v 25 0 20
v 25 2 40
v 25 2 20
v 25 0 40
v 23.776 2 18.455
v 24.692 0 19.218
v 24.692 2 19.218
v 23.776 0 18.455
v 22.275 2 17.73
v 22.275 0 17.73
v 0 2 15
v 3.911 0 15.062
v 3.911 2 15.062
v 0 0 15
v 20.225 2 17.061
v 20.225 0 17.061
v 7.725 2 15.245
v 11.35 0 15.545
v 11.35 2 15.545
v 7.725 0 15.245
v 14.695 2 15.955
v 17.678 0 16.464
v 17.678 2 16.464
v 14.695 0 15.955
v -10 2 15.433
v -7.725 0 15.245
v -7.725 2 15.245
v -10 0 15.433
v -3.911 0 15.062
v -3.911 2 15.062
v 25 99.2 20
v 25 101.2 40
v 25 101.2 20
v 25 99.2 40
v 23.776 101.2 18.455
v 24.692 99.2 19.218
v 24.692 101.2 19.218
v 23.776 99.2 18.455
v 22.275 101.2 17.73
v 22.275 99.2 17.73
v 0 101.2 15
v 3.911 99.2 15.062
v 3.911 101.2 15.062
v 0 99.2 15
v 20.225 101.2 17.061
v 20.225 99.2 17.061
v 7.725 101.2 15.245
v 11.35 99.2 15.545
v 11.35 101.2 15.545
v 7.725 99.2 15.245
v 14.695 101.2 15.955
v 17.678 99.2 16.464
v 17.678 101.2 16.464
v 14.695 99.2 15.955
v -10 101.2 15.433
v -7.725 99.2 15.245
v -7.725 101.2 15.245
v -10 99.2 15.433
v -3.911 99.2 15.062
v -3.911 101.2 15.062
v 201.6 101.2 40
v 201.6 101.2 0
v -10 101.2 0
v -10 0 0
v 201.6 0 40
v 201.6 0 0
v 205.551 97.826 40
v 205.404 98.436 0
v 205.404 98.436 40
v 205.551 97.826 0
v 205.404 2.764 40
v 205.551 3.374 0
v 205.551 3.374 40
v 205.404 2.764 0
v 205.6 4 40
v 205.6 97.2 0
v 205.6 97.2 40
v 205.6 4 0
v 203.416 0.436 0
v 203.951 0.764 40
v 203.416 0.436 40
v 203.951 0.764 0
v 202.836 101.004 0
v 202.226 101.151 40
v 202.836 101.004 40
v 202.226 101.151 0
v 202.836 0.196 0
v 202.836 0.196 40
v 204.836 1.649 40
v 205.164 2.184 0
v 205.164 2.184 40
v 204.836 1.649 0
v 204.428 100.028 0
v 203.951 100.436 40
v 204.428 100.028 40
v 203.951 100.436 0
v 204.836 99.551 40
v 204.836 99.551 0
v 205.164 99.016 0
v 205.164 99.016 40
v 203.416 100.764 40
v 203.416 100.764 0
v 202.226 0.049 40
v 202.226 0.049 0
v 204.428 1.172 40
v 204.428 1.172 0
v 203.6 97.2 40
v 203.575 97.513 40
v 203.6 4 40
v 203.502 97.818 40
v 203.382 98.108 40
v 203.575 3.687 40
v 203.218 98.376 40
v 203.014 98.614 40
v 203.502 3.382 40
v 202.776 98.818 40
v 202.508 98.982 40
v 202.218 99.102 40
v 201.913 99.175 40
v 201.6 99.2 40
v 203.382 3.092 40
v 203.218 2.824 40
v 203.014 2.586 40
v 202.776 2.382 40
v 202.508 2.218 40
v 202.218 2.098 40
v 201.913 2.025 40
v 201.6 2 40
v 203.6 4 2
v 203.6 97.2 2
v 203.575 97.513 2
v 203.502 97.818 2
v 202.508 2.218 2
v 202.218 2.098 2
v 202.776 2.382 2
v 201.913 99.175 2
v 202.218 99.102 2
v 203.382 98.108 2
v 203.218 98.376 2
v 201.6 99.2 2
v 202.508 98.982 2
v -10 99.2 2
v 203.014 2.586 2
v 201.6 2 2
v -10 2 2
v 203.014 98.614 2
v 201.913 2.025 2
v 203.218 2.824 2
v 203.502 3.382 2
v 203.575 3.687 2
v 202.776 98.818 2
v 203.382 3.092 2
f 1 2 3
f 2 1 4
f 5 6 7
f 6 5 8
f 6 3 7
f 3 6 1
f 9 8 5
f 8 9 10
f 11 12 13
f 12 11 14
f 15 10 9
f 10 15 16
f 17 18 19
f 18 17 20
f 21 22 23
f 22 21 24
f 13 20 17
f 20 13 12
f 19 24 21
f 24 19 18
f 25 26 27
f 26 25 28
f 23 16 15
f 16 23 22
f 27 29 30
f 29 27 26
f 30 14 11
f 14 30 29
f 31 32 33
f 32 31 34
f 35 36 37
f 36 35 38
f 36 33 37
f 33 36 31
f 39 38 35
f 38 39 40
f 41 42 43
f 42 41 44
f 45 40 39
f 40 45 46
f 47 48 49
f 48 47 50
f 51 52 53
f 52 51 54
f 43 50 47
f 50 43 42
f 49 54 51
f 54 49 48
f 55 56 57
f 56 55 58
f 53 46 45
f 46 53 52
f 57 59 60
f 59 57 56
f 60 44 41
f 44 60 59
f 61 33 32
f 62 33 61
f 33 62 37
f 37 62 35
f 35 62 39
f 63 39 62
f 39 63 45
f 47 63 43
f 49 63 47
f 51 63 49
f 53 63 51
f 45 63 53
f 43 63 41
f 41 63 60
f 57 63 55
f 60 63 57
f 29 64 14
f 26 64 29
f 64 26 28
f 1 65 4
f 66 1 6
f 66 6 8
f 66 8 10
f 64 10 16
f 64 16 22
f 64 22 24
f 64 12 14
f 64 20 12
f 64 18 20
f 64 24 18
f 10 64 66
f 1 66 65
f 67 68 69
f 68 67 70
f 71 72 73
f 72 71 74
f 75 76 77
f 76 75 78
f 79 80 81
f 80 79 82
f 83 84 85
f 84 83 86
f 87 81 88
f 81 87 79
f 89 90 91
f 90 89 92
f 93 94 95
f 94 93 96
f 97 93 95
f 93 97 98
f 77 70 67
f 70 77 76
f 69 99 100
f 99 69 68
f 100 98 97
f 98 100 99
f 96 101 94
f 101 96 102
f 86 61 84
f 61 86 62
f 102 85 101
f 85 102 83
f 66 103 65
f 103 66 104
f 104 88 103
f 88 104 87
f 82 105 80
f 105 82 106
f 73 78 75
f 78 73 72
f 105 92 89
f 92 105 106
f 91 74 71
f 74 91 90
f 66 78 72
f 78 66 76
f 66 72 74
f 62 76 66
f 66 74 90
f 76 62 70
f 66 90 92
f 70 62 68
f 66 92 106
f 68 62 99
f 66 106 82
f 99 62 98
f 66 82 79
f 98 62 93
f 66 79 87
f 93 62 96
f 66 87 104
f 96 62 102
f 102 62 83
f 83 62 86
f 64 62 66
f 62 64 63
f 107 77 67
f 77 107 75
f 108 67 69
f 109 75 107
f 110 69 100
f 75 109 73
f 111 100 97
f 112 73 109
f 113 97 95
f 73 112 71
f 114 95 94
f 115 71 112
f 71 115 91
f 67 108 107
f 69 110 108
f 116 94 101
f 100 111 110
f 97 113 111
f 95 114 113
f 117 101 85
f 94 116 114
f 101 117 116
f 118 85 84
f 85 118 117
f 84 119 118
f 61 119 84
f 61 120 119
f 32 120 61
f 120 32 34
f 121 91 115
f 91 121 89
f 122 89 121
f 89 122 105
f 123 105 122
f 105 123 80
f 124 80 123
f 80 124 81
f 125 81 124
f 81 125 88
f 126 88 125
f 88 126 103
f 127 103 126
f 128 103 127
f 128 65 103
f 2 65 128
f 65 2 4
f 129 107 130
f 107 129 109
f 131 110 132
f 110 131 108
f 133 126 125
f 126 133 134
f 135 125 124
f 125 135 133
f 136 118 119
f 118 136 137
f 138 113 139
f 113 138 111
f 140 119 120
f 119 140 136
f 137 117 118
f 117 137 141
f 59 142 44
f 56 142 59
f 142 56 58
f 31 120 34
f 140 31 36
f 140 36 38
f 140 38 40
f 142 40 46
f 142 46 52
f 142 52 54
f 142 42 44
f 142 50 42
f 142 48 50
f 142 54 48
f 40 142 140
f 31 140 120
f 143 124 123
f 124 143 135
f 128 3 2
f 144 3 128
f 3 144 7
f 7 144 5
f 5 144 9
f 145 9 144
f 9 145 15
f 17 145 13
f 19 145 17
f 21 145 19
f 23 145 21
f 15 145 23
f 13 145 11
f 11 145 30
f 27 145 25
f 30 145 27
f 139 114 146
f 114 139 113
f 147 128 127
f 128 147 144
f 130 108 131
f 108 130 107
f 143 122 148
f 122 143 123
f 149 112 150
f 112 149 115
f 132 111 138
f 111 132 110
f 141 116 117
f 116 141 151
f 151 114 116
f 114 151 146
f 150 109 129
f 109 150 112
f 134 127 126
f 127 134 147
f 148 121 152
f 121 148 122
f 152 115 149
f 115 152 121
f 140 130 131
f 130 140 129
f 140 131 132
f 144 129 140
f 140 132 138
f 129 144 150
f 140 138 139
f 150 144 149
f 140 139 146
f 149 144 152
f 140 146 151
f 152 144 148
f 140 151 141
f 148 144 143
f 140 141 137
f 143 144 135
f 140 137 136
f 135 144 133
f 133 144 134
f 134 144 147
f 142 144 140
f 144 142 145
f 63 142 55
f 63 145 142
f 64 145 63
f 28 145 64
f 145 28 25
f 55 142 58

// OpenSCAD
include <protective_storage_box.scad>
lid_angle = 0;
show_tray_in_assembly = false;
render_assembly = false;
tray_right();
